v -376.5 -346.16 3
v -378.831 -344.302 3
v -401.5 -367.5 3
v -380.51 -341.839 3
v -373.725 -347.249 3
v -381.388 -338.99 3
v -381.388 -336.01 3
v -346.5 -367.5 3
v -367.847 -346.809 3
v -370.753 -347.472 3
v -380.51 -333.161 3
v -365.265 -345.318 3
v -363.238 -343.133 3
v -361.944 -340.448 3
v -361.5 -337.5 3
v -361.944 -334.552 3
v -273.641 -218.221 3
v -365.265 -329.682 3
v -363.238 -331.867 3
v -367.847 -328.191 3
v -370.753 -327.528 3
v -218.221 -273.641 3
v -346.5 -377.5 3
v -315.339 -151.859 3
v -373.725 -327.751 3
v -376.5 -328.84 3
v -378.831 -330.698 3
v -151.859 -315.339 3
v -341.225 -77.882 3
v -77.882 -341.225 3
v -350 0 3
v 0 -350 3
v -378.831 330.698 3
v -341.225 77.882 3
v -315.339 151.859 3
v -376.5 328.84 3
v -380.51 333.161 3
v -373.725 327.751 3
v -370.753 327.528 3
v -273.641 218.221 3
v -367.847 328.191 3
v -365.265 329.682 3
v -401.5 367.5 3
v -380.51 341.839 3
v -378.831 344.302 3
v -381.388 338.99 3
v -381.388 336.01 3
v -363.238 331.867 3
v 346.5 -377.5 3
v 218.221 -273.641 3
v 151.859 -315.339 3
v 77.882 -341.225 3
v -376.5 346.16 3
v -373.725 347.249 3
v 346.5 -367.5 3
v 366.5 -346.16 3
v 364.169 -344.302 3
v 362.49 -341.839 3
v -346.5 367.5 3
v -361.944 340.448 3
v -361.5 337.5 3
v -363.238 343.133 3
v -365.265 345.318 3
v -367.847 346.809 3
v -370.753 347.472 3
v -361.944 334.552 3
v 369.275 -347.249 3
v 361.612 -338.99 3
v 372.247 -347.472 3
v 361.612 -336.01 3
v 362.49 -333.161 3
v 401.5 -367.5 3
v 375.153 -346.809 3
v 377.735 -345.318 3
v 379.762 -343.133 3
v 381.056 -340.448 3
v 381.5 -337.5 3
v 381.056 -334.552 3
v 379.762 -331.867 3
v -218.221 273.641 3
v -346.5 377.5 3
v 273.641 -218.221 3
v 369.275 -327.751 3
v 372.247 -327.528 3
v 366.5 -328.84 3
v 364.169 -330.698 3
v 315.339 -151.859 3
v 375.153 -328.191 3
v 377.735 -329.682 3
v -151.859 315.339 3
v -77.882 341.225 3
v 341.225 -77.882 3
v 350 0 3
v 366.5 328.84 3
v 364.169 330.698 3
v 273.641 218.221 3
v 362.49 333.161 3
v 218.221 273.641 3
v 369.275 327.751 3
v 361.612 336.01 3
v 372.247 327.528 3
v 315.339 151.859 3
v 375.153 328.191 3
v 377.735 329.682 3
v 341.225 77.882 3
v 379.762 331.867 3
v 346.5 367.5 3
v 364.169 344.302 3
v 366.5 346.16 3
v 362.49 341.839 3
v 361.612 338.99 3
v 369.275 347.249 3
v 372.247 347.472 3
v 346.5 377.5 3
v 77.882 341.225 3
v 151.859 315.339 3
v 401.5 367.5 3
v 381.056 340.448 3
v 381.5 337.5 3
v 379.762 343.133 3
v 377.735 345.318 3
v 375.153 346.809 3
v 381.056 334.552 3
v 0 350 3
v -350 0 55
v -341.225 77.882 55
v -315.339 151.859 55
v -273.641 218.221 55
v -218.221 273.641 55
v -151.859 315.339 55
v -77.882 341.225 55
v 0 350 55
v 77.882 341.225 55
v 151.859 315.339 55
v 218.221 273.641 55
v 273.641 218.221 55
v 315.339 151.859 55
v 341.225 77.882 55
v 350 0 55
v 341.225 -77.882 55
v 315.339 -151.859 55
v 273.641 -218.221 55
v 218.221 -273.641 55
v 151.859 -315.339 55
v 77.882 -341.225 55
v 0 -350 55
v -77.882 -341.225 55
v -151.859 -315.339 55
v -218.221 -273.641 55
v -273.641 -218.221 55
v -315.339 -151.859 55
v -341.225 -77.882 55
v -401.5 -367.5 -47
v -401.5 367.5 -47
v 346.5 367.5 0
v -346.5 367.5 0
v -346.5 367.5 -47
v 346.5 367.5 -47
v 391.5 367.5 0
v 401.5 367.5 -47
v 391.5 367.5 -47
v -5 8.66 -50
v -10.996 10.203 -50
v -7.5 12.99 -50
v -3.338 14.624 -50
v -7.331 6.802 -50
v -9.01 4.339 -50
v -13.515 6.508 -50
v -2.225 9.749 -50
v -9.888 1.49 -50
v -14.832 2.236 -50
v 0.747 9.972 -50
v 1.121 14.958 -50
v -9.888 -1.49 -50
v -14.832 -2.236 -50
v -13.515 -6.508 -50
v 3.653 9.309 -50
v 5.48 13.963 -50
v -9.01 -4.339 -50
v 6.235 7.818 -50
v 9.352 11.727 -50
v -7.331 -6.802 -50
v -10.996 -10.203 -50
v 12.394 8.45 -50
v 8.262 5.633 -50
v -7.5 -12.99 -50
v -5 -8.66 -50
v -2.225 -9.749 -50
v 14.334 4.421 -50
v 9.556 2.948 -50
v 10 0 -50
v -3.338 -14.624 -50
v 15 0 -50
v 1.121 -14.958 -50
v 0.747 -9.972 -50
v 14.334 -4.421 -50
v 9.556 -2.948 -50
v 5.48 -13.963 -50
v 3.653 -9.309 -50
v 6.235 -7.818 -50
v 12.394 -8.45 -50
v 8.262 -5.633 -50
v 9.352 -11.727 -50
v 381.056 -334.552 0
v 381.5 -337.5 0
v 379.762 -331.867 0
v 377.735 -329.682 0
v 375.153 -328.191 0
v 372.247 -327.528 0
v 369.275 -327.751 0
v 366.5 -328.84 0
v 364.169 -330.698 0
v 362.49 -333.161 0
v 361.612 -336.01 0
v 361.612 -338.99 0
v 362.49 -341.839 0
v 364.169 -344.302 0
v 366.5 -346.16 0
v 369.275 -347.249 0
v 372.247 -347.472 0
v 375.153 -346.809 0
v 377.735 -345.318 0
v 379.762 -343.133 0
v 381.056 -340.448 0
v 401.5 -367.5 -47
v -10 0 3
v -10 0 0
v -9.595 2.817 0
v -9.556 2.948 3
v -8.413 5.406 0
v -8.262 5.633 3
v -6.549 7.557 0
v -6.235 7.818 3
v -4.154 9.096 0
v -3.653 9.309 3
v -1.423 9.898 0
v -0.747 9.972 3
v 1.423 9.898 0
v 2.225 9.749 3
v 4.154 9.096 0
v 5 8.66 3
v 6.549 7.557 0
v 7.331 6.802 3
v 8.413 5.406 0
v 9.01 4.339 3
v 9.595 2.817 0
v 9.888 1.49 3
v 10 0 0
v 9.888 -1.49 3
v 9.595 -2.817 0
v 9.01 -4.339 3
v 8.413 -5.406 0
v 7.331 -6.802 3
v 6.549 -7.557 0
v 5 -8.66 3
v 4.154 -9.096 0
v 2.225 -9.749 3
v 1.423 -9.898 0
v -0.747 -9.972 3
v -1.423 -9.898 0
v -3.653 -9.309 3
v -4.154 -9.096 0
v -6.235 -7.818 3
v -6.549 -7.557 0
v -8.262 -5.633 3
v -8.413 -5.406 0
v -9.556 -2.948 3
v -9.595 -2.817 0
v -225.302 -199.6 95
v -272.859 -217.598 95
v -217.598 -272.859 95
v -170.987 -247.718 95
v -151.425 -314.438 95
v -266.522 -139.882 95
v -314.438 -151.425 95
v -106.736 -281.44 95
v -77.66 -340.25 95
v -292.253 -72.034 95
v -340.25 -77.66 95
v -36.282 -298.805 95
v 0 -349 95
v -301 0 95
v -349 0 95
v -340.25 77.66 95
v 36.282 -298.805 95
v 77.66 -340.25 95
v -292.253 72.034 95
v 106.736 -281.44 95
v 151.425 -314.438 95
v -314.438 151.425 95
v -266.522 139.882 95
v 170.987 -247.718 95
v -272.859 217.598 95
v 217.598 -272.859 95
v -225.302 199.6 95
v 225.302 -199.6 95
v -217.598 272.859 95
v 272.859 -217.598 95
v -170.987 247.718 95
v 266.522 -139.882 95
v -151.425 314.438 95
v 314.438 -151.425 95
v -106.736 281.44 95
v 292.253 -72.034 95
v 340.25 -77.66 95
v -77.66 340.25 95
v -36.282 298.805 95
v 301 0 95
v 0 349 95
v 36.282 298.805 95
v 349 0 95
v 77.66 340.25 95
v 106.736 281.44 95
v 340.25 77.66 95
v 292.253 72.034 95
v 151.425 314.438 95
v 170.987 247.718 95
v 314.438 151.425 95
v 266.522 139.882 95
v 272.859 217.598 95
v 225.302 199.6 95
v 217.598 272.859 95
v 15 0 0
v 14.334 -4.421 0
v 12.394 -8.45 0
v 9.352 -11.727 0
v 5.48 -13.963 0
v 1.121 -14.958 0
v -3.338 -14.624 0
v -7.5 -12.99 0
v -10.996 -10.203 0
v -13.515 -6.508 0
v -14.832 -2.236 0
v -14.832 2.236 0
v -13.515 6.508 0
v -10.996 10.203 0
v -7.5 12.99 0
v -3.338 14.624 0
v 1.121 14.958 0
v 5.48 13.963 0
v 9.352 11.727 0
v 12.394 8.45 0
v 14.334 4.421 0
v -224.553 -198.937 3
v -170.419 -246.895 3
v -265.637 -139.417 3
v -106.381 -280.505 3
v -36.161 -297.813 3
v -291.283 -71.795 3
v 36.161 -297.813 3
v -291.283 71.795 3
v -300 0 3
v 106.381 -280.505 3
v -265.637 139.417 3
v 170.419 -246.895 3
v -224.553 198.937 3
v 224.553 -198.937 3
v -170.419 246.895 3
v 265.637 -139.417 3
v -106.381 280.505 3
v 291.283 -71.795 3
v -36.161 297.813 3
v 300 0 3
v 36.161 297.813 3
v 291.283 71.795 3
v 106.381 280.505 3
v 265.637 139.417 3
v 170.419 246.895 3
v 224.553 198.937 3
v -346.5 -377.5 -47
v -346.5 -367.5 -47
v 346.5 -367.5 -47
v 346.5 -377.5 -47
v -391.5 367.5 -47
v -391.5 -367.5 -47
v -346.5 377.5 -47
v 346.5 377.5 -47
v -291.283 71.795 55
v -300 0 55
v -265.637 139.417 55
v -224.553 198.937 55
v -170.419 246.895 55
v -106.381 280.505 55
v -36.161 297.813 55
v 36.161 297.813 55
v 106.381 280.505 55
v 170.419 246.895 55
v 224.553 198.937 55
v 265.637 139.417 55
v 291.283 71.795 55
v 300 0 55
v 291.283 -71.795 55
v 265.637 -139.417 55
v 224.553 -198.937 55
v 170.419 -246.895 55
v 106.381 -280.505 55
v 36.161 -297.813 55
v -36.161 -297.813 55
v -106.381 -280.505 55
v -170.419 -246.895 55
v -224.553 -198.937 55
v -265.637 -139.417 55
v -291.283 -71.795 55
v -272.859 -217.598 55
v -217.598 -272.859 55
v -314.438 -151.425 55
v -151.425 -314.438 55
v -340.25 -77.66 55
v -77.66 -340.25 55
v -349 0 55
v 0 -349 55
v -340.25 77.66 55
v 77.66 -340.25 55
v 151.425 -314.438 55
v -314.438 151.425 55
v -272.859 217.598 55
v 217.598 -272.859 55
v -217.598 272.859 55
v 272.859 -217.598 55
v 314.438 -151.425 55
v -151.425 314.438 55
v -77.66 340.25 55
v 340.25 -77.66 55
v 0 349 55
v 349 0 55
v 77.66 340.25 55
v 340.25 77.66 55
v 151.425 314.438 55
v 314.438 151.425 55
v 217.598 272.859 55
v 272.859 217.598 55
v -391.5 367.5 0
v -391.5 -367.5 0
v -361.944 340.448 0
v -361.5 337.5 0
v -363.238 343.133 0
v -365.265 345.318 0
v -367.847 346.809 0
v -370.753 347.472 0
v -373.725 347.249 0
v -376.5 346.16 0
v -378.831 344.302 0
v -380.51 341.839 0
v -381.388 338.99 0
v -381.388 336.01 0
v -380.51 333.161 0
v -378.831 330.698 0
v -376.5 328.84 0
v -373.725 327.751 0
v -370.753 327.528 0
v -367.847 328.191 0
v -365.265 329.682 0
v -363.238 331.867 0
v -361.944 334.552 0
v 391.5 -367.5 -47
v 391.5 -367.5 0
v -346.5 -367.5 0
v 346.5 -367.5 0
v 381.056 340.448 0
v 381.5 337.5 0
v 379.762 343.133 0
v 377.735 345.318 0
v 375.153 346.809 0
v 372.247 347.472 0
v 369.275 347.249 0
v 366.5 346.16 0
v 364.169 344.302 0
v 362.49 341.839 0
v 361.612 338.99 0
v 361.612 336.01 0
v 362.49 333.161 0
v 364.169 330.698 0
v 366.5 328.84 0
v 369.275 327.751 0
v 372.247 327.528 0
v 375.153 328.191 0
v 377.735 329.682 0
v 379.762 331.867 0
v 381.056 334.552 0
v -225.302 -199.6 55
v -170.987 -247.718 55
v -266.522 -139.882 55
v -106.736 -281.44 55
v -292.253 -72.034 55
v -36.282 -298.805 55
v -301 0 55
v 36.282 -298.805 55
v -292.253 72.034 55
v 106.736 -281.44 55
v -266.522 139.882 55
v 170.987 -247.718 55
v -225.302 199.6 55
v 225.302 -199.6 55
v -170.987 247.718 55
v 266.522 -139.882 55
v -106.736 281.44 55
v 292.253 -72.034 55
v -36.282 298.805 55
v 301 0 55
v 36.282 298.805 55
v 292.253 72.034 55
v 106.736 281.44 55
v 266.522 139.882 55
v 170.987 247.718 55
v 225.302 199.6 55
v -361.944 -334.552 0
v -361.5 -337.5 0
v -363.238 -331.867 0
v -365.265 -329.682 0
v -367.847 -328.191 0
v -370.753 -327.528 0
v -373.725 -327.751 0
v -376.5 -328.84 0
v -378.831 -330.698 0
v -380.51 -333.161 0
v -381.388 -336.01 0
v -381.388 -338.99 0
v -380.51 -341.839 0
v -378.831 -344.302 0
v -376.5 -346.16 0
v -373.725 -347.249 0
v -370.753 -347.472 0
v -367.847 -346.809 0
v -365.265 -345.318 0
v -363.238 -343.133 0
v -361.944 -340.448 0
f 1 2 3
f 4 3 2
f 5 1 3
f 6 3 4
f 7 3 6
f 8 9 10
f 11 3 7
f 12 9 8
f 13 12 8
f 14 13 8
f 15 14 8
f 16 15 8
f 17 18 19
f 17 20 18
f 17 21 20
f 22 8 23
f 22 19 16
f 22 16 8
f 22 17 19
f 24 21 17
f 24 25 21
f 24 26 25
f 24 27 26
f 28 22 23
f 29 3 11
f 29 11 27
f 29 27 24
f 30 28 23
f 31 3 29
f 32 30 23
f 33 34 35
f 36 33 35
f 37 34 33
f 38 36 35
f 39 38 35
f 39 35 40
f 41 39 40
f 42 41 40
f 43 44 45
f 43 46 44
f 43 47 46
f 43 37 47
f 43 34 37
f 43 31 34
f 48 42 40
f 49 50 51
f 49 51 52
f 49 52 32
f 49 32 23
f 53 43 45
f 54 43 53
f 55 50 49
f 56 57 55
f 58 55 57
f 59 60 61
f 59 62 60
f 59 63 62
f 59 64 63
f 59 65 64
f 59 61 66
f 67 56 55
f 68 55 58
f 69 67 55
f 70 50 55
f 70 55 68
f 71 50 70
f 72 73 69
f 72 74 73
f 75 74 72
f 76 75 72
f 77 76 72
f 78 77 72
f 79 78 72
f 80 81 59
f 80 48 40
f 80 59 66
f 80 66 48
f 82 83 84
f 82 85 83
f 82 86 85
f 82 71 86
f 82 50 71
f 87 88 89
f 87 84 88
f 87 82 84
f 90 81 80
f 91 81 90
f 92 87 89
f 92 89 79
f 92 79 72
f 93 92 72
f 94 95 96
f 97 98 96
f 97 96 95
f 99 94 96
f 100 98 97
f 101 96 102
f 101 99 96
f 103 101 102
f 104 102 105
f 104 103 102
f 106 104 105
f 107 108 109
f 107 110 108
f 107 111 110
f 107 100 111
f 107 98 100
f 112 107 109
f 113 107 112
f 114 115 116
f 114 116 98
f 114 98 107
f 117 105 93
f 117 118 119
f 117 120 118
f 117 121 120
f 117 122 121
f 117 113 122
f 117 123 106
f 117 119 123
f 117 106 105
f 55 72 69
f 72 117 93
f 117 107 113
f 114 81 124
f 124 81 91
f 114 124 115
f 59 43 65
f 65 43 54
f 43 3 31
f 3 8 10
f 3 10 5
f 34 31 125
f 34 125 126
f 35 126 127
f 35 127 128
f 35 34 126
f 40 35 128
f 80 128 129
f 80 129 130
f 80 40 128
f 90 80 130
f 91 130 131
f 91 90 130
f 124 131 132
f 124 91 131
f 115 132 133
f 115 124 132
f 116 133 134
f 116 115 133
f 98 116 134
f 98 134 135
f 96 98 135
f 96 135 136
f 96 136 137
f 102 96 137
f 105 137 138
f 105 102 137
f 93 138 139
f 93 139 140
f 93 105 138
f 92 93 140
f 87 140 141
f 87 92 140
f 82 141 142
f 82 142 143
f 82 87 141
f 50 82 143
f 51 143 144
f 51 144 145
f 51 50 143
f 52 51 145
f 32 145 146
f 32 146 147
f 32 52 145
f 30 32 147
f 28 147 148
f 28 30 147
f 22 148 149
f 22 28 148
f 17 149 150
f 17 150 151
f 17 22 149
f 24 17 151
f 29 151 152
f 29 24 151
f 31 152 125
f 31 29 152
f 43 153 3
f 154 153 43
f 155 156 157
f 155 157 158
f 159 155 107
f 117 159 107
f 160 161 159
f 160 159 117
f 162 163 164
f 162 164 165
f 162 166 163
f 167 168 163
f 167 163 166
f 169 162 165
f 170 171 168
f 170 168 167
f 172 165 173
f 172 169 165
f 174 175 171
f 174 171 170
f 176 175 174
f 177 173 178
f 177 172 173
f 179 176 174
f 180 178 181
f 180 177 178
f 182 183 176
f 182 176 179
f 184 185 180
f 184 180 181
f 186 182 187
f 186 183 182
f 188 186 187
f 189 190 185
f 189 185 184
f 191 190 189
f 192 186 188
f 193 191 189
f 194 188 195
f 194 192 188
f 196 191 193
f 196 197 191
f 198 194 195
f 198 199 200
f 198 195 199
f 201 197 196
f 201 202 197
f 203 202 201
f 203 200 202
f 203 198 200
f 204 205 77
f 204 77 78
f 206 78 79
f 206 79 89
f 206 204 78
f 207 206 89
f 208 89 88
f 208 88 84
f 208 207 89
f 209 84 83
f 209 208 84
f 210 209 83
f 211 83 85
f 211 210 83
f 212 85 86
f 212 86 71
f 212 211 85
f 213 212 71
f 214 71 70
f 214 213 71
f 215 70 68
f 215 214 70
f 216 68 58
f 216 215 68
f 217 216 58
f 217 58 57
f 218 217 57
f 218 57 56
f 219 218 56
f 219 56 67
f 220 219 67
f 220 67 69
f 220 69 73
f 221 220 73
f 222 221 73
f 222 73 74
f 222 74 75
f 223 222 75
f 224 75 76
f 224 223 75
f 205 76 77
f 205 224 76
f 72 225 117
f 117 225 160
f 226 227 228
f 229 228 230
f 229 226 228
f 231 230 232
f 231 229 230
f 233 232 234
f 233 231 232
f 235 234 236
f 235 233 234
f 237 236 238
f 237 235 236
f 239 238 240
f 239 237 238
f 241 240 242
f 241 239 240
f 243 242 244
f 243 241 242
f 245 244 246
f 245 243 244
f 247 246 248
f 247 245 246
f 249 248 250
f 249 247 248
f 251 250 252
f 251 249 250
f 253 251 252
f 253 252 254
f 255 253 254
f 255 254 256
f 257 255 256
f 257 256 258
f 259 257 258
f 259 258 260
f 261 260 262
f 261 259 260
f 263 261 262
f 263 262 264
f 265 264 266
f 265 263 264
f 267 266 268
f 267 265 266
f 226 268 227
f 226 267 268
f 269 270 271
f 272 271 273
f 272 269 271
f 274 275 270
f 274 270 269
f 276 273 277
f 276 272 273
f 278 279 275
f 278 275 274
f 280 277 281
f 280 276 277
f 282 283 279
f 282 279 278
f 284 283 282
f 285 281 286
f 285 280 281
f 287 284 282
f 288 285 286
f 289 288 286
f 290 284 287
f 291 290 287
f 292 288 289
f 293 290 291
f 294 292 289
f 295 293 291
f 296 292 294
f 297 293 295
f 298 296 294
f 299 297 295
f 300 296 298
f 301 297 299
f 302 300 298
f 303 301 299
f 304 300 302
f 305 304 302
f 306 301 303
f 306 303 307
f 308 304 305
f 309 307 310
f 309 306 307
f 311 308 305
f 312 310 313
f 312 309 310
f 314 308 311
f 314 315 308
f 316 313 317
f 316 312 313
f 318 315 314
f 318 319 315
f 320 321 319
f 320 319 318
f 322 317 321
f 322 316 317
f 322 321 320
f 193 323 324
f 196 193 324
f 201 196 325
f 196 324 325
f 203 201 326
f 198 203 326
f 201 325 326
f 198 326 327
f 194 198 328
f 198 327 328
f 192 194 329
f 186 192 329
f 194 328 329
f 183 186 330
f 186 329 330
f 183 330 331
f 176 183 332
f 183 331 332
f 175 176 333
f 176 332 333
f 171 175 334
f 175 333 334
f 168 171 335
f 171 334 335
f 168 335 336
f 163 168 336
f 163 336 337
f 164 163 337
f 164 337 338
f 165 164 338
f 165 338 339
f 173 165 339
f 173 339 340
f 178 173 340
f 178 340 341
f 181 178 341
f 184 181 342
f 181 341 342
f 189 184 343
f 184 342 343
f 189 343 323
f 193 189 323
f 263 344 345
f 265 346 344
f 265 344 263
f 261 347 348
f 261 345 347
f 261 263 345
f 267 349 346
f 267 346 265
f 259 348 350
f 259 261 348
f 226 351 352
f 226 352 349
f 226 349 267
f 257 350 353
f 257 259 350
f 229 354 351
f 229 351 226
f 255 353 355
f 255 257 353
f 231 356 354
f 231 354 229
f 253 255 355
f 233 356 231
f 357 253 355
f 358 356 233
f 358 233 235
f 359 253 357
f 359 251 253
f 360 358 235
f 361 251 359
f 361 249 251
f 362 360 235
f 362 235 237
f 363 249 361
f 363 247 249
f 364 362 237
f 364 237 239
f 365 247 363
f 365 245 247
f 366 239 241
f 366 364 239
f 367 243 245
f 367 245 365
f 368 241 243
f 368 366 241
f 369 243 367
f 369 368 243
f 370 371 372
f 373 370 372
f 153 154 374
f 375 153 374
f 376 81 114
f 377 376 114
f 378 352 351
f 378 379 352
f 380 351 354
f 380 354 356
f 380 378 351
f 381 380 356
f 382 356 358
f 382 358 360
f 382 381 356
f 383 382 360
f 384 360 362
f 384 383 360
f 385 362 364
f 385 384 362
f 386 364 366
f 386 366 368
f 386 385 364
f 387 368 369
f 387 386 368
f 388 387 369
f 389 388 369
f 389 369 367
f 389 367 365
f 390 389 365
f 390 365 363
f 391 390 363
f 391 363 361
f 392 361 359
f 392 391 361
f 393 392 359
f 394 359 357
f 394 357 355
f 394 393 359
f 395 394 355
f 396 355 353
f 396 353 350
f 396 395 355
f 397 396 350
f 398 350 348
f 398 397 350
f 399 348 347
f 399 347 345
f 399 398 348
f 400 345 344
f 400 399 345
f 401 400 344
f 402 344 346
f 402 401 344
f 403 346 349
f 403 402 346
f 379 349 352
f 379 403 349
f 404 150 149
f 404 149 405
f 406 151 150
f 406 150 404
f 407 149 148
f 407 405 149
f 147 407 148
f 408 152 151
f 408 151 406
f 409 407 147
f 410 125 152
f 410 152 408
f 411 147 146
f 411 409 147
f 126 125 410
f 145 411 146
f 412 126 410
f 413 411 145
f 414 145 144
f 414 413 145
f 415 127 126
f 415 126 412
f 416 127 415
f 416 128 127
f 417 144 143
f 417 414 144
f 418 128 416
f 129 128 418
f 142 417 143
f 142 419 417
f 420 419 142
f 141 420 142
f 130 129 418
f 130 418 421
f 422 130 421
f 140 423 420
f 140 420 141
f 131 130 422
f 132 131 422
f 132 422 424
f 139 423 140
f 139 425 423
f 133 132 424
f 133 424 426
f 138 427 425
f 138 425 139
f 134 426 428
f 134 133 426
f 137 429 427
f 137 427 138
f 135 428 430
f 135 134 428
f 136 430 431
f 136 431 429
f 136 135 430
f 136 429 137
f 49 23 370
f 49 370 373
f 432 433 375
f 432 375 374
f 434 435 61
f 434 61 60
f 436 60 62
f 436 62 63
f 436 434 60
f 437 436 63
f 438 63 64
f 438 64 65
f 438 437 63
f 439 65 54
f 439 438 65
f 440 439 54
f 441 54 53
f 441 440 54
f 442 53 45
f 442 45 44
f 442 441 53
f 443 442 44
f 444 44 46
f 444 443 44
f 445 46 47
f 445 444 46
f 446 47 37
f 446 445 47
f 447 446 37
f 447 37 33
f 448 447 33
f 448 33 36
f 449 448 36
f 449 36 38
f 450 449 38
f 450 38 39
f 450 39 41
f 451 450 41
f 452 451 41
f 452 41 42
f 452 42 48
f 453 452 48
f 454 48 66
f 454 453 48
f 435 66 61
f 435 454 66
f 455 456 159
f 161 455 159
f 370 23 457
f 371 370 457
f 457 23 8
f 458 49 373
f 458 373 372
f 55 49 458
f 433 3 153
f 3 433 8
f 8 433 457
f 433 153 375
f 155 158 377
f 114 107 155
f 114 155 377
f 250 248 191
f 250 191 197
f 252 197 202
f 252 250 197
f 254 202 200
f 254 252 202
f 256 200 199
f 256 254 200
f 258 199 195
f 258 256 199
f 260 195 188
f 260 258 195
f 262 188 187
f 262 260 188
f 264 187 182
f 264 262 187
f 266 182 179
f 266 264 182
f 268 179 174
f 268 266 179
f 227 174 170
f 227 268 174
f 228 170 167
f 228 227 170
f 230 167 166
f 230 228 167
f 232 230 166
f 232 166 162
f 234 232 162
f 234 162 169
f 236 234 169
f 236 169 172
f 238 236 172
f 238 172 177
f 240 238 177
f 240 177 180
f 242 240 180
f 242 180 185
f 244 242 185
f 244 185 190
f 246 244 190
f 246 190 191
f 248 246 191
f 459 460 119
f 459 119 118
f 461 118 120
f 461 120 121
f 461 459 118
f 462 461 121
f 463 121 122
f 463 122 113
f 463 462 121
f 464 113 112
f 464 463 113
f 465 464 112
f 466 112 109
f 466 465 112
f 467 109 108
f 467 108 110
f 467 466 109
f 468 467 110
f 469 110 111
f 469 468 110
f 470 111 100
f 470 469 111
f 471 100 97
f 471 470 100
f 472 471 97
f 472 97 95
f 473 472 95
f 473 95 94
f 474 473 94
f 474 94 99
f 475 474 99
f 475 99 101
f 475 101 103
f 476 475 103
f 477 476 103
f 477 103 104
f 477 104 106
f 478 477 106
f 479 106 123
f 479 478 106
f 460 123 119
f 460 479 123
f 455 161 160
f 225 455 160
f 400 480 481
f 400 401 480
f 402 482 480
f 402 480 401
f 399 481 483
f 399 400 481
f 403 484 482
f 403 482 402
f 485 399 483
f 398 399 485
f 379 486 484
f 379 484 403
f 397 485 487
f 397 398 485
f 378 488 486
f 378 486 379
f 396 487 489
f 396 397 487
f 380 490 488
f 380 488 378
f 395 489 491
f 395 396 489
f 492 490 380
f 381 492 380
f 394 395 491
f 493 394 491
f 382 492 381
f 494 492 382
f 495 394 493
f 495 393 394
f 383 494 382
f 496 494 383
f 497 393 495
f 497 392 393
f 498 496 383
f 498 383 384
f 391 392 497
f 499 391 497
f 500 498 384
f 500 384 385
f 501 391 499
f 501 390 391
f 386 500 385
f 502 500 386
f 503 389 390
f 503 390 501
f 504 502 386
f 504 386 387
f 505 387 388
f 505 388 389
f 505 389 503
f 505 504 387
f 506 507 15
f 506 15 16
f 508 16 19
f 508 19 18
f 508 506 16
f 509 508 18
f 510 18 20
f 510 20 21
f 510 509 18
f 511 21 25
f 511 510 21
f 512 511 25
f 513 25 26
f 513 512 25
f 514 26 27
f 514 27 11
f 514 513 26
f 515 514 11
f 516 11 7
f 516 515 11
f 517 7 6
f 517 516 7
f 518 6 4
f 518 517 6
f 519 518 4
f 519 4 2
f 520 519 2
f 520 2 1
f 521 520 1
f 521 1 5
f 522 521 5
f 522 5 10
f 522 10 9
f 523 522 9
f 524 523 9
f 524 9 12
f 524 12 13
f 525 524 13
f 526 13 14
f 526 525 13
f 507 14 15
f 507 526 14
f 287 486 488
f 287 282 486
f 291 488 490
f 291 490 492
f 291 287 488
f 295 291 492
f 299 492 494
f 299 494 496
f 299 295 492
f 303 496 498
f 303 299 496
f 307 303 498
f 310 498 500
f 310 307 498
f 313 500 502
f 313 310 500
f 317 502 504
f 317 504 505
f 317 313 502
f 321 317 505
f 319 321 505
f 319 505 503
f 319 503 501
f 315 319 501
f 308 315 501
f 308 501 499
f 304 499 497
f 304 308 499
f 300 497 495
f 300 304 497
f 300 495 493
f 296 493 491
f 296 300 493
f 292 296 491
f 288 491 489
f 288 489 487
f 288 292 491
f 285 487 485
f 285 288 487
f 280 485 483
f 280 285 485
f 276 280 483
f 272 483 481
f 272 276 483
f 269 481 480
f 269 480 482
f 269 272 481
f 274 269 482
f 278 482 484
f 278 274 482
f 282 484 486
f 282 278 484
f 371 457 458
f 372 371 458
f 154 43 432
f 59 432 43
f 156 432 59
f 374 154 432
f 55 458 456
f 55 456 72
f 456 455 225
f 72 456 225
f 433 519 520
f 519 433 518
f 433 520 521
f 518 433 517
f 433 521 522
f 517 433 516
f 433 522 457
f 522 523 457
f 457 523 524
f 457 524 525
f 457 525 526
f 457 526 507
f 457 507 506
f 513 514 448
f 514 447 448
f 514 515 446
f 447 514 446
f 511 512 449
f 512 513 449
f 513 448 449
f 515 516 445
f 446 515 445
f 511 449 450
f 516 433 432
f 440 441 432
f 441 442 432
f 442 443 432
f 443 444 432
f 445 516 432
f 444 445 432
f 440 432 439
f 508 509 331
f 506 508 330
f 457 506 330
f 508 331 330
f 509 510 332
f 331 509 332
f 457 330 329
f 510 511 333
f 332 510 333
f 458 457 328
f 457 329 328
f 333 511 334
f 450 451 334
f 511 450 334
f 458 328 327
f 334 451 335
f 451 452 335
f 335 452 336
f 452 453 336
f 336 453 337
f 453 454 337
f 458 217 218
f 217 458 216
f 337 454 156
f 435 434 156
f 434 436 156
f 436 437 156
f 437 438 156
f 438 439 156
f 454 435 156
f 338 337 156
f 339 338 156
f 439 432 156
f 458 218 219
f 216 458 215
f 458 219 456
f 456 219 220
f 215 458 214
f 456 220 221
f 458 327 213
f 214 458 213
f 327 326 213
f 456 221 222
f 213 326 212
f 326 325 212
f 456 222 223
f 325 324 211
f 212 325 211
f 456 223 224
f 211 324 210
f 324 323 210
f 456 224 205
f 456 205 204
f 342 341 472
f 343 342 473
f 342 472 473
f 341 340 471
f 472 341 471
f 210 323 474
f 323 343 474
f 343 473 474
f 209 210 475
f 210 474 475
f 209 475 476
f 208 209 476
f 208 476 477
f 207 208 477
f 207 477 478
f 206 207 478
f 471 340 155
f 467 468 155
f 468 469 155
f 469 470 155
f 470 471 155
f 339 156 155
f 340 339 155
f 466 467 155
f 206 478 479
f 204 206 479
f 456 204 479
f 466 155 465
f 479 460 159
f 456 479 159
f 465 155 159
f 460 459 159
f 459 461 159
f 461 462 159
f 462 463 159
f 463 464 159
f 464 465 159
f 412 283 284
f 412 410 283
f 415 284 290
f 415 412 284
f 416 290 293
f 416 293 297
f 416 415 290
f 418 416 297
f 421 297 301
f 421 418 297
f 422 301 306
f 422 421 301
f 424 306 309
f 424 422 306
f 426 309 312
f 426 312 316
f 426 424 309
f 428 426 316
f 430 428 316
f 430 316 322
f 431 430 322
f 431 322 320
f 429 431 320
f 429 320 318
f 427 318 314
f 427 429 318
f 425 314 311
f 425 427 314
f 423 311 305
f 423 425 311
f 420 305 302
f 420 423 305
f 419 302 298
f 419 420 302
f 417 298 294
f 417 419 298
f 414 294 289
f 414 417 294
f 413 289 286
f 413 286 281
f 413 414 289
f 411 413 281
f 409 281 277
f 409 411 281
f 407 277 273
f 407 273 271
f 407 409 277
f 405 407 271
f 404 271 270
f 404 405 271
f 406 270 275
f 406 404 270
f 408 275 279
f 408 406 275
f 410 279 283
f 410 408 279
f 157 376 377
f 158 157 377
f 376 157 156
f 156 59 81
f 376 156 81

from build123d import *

# Parameters (mm, degrees)
F2_W     = 803
F2_H     = 735
F2_R     = 10
F2_R_2   = 301
F3_DEPTH = 3
F4_W     = 693
F4_H     = 10
F4_W_2   = 10
F4_H_2   = 735
F5_DEPTH = 50
F6_R     = 15
F6_R_2   = 10
F7_DEPTH = 50


with BuildPart() as f1:
    # F0 (on Front) → F1 (revolve)
    with BuildSketch(Plane.XZ):
        Polygon((-350, 3), (-300, 3), (-300, 55), (-301, 55), (-301, 95), (-349, 95), (-349, 55), (-350, 55), align=None)
        Polygon((-10, 3), (-300, 3), (-350, 3), (-350, 0), (-10, 0), align=None)
    revolve(axis=Axis((0, 0, 187.921241), (0, 0, -1)))

    # F2 (on Top) → F3 (join)
    with BuildSketch(Plane.XY):
        Rectangle(F2_W, F2_H)
        with Locations((-371.5, -337.5)):
            Circle(F2_R, mode=Mode.SUBTRACT)
        with Locations((371.5, -337.5)):
            Circle(F2_R, mode=Mode.SUBTRACT)
        Circle(F2_R_2, mode=Mode.SUBTRACT)
        with Locations((-371.5, 337.5)):
            Circle(F2_R, mode=Mode.SUBTRACT)
        with Locations((371.5, 337.5)):
            Circle(F2_R, mode=Mode.SUBTRACT)
    extrude(amount=F3_DEPTH)

    # F4 (on face) → F5 (join)
    with BuildSketch(Plane.XY.offset(3)):
        with Locations((0, -372.5)):
            Rectangle(F4_W, F4_H)
        with Locations((-396.5, 0)):
            Rectangle(F4_W_2, F4_H_2)
        with Locations((0, 372.5)):
            Rectangle(F4_W, F4_H)
        with Locations((396.5, 0)):
            Rectangle(F4_W_2, F4_H_2)
    extrude(amount=-F5_DEPTH)

    # F6 (on face) → F7 (join)
    with BuildSketch(Plane(origin=(0, 0, 0), x_dir=(1, 0, 0), z_dir=(0, 0, -1))):
        Circle(F6_R)
        Circle(F6_R_2, mode=Mode.SUBTRACT)
    extrude(amount=F7_DEPTH)


solid = f1.part
